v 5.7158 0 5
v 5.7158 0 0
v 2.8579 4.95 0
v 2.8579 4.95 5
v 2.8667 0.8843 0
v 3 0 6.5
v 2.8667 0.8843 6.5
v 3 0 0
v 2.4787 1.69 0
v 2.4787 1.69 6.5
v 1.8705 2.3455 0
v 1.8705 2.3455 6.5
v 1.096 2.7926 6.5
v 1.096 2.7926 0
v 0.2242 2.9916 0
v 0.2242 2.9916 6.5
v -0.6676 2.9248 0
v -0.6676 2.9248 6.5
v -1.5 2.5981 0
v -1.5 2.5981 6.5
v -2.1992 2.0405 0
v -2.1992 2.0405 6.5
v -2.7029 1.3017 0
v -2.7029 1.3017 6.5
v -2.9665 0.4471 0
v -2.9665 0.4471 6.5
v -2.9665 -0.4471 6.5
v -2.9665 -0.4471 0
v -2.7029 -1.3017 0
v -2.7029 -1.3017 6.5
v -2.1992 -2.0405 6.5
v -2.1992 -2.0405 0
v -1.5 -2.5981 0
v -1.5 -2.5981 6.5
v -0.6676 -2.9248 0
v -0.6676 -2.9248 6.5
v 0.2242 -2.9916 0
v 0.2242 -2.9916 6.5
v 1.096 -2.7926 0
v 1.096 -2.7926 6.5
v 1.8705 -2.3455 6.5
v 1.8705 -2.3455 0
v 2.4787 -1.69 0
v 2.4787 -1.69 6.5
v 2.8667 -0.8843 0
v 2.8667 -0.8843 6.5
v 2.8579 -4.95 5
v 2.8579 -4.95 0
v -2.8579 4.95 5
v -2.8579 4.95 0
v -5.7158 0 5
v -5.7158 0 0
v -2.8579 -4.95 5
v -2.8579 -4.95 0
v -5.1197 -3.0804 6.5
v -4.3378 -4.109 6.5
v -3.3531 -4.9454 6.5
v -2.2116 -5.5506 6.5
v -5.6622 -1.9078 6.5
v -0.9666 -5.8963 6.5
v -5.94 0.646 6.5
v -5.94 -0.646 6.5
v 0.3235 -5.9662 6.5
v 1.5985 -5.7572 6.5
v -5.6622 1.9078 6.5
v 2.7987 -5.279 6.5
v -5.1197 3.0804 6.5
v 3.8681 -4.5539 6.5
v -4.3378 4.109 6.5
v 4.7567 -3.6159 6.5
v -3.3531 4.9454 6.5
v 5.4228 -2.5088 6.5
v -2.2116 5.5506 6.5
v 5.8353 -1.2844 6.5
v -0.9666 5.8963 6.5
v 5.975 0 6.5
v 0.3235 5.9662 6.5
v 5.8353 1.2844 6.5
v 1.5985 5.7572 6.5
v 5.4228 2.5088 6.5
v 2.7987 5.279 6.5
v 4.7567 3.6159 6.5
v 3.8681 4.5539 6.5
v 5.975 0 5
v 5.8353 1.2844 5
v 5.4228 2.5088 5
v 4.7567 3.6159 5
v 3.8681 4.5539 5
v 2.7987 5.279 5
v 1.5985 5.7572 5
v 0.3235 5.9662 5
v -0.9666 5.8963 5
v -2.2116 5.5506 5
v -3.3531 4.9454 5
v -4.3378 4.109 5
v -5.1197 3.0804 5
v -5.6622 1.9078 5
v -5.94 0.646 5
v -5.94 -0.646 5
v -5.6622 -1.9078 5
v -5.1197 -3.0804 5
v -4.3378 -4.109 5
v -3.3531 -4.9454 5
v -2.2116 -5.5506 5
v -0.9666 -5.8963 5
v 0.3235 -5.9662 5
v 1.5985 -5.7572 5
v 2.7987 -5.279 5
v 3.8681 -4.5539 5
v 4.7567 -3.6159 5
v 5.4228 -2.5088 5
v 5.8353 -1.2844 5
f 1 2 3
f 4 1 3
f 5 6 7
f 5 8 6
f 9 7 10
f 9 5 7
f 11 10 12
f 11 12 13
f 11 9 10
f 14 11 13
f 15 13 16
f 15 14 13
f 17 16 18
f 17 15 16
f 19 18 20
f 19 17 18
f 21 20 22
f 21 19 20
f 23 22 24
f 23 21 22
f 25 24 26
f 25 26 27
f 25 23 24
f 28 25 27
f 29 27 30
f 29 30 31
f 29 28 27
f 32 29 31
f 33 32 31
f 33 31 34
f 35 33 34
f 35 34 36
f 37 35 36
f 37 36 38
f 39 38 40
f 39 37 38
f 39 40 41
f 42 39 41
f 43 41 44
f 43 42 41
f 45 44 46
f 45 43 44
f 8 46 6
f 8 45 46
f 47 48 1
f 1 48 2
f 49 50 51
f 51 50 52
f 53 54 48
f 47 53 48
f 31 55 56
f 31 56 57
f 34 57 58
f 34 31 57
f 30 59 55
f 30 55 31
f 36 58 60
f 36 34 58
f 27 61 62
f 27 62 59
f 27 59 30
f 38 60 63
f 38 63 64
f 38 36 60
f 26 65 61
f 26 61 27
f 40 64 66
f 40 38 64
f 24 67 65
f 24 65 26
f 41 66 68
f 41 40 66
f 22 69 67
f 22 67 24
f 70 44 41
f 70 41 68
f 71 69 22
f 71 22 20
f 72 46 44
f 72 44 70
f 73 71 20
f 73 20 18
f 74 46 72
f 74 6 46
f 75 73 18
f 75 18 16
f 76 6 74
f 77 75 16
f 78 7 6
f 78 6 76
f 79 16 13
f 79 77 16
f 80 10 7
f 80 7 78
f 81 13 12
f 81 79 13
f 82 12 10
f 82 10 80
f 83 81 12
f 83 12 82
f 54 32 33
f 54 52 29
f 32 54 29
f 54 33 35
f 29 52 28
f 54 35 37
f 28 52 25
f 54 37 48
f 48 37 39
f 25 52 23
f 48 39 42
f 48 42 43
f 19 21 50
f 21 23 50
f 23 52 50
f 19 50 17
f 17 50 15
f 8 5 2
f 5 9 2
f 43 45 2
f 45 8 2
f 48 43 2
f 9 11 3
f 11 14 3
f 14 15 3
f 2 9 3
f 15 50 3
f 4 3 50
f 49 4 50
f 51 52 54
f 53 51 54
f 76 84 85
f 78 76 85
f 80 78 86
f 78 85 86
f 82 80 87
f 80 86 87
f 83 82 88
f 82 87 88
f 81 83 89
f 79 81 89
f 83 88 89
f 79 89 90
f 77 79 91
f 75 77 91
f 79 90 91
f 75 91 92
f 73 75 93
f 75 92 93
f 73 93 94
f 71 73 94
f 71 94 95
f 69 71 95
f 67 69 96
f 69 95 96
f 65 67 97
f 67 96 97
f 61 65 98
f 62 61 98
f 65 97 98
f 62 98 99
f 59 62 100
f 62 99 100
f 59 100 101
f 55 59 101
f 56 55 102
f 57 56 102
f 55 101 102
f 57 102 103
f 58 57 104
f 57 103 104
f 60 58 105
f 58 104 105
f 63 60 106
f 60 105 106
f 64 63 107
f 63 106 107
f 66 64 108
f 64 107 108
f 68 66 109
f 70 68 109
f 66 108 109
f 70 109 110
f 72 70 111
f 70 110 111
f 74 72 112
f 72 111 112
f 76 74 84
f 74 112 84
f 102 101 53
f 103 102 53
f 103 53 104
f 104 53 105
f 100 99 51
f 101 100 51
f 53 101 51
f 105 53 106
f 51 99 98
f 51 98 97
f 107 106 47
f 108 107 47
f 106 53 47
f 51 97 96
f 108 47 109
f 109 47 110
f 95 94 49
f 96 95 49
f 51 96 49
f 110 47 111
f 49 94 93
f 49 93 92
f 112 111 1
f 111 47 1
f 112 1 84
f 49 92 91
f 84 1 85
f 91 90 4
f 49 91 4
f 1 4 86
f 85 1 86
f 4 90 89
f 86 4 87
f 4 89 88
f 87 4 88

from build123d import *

# Parameters (mm, degrees)
SKETCH1_R           = 3
BOSS_EXTRUDE1_DEPTH = 5
SKETCH2_R           = 5.975
SKETCH2_R_2         = 3
BOSS_EXTRUDE2_DEPTH = 1.5


with BuildPart() as part:
    # Sketch1 → Boss-Extrude1 (new body)
    with BuildSketch(Plane.XY):
        Polygon((-5.715767665, 0), (-2.857883832, -4.95), (2.857883832, -4.95), (5.715767665, 0), (2.857883832, 4.95), (-2.857883832, 4.95), align=None)
        Circle(SKETCH1_R, mode=Mode.SUBTRACT)
    extrude(amount=BOSS_EXTRUDE1_DEPTH)

    # Sketch2 → Boss-Extrude2 (add)
    with BuildSketch(Plane.XY.offset(5)):
        Circle(SKETCH2_R)
        Circle(SKETCH2_R_2, mode=Mode.SUBTRACT)
    extrude(amount=BOSS_EXTRUDE2_DEPTH)


solid = part.part
